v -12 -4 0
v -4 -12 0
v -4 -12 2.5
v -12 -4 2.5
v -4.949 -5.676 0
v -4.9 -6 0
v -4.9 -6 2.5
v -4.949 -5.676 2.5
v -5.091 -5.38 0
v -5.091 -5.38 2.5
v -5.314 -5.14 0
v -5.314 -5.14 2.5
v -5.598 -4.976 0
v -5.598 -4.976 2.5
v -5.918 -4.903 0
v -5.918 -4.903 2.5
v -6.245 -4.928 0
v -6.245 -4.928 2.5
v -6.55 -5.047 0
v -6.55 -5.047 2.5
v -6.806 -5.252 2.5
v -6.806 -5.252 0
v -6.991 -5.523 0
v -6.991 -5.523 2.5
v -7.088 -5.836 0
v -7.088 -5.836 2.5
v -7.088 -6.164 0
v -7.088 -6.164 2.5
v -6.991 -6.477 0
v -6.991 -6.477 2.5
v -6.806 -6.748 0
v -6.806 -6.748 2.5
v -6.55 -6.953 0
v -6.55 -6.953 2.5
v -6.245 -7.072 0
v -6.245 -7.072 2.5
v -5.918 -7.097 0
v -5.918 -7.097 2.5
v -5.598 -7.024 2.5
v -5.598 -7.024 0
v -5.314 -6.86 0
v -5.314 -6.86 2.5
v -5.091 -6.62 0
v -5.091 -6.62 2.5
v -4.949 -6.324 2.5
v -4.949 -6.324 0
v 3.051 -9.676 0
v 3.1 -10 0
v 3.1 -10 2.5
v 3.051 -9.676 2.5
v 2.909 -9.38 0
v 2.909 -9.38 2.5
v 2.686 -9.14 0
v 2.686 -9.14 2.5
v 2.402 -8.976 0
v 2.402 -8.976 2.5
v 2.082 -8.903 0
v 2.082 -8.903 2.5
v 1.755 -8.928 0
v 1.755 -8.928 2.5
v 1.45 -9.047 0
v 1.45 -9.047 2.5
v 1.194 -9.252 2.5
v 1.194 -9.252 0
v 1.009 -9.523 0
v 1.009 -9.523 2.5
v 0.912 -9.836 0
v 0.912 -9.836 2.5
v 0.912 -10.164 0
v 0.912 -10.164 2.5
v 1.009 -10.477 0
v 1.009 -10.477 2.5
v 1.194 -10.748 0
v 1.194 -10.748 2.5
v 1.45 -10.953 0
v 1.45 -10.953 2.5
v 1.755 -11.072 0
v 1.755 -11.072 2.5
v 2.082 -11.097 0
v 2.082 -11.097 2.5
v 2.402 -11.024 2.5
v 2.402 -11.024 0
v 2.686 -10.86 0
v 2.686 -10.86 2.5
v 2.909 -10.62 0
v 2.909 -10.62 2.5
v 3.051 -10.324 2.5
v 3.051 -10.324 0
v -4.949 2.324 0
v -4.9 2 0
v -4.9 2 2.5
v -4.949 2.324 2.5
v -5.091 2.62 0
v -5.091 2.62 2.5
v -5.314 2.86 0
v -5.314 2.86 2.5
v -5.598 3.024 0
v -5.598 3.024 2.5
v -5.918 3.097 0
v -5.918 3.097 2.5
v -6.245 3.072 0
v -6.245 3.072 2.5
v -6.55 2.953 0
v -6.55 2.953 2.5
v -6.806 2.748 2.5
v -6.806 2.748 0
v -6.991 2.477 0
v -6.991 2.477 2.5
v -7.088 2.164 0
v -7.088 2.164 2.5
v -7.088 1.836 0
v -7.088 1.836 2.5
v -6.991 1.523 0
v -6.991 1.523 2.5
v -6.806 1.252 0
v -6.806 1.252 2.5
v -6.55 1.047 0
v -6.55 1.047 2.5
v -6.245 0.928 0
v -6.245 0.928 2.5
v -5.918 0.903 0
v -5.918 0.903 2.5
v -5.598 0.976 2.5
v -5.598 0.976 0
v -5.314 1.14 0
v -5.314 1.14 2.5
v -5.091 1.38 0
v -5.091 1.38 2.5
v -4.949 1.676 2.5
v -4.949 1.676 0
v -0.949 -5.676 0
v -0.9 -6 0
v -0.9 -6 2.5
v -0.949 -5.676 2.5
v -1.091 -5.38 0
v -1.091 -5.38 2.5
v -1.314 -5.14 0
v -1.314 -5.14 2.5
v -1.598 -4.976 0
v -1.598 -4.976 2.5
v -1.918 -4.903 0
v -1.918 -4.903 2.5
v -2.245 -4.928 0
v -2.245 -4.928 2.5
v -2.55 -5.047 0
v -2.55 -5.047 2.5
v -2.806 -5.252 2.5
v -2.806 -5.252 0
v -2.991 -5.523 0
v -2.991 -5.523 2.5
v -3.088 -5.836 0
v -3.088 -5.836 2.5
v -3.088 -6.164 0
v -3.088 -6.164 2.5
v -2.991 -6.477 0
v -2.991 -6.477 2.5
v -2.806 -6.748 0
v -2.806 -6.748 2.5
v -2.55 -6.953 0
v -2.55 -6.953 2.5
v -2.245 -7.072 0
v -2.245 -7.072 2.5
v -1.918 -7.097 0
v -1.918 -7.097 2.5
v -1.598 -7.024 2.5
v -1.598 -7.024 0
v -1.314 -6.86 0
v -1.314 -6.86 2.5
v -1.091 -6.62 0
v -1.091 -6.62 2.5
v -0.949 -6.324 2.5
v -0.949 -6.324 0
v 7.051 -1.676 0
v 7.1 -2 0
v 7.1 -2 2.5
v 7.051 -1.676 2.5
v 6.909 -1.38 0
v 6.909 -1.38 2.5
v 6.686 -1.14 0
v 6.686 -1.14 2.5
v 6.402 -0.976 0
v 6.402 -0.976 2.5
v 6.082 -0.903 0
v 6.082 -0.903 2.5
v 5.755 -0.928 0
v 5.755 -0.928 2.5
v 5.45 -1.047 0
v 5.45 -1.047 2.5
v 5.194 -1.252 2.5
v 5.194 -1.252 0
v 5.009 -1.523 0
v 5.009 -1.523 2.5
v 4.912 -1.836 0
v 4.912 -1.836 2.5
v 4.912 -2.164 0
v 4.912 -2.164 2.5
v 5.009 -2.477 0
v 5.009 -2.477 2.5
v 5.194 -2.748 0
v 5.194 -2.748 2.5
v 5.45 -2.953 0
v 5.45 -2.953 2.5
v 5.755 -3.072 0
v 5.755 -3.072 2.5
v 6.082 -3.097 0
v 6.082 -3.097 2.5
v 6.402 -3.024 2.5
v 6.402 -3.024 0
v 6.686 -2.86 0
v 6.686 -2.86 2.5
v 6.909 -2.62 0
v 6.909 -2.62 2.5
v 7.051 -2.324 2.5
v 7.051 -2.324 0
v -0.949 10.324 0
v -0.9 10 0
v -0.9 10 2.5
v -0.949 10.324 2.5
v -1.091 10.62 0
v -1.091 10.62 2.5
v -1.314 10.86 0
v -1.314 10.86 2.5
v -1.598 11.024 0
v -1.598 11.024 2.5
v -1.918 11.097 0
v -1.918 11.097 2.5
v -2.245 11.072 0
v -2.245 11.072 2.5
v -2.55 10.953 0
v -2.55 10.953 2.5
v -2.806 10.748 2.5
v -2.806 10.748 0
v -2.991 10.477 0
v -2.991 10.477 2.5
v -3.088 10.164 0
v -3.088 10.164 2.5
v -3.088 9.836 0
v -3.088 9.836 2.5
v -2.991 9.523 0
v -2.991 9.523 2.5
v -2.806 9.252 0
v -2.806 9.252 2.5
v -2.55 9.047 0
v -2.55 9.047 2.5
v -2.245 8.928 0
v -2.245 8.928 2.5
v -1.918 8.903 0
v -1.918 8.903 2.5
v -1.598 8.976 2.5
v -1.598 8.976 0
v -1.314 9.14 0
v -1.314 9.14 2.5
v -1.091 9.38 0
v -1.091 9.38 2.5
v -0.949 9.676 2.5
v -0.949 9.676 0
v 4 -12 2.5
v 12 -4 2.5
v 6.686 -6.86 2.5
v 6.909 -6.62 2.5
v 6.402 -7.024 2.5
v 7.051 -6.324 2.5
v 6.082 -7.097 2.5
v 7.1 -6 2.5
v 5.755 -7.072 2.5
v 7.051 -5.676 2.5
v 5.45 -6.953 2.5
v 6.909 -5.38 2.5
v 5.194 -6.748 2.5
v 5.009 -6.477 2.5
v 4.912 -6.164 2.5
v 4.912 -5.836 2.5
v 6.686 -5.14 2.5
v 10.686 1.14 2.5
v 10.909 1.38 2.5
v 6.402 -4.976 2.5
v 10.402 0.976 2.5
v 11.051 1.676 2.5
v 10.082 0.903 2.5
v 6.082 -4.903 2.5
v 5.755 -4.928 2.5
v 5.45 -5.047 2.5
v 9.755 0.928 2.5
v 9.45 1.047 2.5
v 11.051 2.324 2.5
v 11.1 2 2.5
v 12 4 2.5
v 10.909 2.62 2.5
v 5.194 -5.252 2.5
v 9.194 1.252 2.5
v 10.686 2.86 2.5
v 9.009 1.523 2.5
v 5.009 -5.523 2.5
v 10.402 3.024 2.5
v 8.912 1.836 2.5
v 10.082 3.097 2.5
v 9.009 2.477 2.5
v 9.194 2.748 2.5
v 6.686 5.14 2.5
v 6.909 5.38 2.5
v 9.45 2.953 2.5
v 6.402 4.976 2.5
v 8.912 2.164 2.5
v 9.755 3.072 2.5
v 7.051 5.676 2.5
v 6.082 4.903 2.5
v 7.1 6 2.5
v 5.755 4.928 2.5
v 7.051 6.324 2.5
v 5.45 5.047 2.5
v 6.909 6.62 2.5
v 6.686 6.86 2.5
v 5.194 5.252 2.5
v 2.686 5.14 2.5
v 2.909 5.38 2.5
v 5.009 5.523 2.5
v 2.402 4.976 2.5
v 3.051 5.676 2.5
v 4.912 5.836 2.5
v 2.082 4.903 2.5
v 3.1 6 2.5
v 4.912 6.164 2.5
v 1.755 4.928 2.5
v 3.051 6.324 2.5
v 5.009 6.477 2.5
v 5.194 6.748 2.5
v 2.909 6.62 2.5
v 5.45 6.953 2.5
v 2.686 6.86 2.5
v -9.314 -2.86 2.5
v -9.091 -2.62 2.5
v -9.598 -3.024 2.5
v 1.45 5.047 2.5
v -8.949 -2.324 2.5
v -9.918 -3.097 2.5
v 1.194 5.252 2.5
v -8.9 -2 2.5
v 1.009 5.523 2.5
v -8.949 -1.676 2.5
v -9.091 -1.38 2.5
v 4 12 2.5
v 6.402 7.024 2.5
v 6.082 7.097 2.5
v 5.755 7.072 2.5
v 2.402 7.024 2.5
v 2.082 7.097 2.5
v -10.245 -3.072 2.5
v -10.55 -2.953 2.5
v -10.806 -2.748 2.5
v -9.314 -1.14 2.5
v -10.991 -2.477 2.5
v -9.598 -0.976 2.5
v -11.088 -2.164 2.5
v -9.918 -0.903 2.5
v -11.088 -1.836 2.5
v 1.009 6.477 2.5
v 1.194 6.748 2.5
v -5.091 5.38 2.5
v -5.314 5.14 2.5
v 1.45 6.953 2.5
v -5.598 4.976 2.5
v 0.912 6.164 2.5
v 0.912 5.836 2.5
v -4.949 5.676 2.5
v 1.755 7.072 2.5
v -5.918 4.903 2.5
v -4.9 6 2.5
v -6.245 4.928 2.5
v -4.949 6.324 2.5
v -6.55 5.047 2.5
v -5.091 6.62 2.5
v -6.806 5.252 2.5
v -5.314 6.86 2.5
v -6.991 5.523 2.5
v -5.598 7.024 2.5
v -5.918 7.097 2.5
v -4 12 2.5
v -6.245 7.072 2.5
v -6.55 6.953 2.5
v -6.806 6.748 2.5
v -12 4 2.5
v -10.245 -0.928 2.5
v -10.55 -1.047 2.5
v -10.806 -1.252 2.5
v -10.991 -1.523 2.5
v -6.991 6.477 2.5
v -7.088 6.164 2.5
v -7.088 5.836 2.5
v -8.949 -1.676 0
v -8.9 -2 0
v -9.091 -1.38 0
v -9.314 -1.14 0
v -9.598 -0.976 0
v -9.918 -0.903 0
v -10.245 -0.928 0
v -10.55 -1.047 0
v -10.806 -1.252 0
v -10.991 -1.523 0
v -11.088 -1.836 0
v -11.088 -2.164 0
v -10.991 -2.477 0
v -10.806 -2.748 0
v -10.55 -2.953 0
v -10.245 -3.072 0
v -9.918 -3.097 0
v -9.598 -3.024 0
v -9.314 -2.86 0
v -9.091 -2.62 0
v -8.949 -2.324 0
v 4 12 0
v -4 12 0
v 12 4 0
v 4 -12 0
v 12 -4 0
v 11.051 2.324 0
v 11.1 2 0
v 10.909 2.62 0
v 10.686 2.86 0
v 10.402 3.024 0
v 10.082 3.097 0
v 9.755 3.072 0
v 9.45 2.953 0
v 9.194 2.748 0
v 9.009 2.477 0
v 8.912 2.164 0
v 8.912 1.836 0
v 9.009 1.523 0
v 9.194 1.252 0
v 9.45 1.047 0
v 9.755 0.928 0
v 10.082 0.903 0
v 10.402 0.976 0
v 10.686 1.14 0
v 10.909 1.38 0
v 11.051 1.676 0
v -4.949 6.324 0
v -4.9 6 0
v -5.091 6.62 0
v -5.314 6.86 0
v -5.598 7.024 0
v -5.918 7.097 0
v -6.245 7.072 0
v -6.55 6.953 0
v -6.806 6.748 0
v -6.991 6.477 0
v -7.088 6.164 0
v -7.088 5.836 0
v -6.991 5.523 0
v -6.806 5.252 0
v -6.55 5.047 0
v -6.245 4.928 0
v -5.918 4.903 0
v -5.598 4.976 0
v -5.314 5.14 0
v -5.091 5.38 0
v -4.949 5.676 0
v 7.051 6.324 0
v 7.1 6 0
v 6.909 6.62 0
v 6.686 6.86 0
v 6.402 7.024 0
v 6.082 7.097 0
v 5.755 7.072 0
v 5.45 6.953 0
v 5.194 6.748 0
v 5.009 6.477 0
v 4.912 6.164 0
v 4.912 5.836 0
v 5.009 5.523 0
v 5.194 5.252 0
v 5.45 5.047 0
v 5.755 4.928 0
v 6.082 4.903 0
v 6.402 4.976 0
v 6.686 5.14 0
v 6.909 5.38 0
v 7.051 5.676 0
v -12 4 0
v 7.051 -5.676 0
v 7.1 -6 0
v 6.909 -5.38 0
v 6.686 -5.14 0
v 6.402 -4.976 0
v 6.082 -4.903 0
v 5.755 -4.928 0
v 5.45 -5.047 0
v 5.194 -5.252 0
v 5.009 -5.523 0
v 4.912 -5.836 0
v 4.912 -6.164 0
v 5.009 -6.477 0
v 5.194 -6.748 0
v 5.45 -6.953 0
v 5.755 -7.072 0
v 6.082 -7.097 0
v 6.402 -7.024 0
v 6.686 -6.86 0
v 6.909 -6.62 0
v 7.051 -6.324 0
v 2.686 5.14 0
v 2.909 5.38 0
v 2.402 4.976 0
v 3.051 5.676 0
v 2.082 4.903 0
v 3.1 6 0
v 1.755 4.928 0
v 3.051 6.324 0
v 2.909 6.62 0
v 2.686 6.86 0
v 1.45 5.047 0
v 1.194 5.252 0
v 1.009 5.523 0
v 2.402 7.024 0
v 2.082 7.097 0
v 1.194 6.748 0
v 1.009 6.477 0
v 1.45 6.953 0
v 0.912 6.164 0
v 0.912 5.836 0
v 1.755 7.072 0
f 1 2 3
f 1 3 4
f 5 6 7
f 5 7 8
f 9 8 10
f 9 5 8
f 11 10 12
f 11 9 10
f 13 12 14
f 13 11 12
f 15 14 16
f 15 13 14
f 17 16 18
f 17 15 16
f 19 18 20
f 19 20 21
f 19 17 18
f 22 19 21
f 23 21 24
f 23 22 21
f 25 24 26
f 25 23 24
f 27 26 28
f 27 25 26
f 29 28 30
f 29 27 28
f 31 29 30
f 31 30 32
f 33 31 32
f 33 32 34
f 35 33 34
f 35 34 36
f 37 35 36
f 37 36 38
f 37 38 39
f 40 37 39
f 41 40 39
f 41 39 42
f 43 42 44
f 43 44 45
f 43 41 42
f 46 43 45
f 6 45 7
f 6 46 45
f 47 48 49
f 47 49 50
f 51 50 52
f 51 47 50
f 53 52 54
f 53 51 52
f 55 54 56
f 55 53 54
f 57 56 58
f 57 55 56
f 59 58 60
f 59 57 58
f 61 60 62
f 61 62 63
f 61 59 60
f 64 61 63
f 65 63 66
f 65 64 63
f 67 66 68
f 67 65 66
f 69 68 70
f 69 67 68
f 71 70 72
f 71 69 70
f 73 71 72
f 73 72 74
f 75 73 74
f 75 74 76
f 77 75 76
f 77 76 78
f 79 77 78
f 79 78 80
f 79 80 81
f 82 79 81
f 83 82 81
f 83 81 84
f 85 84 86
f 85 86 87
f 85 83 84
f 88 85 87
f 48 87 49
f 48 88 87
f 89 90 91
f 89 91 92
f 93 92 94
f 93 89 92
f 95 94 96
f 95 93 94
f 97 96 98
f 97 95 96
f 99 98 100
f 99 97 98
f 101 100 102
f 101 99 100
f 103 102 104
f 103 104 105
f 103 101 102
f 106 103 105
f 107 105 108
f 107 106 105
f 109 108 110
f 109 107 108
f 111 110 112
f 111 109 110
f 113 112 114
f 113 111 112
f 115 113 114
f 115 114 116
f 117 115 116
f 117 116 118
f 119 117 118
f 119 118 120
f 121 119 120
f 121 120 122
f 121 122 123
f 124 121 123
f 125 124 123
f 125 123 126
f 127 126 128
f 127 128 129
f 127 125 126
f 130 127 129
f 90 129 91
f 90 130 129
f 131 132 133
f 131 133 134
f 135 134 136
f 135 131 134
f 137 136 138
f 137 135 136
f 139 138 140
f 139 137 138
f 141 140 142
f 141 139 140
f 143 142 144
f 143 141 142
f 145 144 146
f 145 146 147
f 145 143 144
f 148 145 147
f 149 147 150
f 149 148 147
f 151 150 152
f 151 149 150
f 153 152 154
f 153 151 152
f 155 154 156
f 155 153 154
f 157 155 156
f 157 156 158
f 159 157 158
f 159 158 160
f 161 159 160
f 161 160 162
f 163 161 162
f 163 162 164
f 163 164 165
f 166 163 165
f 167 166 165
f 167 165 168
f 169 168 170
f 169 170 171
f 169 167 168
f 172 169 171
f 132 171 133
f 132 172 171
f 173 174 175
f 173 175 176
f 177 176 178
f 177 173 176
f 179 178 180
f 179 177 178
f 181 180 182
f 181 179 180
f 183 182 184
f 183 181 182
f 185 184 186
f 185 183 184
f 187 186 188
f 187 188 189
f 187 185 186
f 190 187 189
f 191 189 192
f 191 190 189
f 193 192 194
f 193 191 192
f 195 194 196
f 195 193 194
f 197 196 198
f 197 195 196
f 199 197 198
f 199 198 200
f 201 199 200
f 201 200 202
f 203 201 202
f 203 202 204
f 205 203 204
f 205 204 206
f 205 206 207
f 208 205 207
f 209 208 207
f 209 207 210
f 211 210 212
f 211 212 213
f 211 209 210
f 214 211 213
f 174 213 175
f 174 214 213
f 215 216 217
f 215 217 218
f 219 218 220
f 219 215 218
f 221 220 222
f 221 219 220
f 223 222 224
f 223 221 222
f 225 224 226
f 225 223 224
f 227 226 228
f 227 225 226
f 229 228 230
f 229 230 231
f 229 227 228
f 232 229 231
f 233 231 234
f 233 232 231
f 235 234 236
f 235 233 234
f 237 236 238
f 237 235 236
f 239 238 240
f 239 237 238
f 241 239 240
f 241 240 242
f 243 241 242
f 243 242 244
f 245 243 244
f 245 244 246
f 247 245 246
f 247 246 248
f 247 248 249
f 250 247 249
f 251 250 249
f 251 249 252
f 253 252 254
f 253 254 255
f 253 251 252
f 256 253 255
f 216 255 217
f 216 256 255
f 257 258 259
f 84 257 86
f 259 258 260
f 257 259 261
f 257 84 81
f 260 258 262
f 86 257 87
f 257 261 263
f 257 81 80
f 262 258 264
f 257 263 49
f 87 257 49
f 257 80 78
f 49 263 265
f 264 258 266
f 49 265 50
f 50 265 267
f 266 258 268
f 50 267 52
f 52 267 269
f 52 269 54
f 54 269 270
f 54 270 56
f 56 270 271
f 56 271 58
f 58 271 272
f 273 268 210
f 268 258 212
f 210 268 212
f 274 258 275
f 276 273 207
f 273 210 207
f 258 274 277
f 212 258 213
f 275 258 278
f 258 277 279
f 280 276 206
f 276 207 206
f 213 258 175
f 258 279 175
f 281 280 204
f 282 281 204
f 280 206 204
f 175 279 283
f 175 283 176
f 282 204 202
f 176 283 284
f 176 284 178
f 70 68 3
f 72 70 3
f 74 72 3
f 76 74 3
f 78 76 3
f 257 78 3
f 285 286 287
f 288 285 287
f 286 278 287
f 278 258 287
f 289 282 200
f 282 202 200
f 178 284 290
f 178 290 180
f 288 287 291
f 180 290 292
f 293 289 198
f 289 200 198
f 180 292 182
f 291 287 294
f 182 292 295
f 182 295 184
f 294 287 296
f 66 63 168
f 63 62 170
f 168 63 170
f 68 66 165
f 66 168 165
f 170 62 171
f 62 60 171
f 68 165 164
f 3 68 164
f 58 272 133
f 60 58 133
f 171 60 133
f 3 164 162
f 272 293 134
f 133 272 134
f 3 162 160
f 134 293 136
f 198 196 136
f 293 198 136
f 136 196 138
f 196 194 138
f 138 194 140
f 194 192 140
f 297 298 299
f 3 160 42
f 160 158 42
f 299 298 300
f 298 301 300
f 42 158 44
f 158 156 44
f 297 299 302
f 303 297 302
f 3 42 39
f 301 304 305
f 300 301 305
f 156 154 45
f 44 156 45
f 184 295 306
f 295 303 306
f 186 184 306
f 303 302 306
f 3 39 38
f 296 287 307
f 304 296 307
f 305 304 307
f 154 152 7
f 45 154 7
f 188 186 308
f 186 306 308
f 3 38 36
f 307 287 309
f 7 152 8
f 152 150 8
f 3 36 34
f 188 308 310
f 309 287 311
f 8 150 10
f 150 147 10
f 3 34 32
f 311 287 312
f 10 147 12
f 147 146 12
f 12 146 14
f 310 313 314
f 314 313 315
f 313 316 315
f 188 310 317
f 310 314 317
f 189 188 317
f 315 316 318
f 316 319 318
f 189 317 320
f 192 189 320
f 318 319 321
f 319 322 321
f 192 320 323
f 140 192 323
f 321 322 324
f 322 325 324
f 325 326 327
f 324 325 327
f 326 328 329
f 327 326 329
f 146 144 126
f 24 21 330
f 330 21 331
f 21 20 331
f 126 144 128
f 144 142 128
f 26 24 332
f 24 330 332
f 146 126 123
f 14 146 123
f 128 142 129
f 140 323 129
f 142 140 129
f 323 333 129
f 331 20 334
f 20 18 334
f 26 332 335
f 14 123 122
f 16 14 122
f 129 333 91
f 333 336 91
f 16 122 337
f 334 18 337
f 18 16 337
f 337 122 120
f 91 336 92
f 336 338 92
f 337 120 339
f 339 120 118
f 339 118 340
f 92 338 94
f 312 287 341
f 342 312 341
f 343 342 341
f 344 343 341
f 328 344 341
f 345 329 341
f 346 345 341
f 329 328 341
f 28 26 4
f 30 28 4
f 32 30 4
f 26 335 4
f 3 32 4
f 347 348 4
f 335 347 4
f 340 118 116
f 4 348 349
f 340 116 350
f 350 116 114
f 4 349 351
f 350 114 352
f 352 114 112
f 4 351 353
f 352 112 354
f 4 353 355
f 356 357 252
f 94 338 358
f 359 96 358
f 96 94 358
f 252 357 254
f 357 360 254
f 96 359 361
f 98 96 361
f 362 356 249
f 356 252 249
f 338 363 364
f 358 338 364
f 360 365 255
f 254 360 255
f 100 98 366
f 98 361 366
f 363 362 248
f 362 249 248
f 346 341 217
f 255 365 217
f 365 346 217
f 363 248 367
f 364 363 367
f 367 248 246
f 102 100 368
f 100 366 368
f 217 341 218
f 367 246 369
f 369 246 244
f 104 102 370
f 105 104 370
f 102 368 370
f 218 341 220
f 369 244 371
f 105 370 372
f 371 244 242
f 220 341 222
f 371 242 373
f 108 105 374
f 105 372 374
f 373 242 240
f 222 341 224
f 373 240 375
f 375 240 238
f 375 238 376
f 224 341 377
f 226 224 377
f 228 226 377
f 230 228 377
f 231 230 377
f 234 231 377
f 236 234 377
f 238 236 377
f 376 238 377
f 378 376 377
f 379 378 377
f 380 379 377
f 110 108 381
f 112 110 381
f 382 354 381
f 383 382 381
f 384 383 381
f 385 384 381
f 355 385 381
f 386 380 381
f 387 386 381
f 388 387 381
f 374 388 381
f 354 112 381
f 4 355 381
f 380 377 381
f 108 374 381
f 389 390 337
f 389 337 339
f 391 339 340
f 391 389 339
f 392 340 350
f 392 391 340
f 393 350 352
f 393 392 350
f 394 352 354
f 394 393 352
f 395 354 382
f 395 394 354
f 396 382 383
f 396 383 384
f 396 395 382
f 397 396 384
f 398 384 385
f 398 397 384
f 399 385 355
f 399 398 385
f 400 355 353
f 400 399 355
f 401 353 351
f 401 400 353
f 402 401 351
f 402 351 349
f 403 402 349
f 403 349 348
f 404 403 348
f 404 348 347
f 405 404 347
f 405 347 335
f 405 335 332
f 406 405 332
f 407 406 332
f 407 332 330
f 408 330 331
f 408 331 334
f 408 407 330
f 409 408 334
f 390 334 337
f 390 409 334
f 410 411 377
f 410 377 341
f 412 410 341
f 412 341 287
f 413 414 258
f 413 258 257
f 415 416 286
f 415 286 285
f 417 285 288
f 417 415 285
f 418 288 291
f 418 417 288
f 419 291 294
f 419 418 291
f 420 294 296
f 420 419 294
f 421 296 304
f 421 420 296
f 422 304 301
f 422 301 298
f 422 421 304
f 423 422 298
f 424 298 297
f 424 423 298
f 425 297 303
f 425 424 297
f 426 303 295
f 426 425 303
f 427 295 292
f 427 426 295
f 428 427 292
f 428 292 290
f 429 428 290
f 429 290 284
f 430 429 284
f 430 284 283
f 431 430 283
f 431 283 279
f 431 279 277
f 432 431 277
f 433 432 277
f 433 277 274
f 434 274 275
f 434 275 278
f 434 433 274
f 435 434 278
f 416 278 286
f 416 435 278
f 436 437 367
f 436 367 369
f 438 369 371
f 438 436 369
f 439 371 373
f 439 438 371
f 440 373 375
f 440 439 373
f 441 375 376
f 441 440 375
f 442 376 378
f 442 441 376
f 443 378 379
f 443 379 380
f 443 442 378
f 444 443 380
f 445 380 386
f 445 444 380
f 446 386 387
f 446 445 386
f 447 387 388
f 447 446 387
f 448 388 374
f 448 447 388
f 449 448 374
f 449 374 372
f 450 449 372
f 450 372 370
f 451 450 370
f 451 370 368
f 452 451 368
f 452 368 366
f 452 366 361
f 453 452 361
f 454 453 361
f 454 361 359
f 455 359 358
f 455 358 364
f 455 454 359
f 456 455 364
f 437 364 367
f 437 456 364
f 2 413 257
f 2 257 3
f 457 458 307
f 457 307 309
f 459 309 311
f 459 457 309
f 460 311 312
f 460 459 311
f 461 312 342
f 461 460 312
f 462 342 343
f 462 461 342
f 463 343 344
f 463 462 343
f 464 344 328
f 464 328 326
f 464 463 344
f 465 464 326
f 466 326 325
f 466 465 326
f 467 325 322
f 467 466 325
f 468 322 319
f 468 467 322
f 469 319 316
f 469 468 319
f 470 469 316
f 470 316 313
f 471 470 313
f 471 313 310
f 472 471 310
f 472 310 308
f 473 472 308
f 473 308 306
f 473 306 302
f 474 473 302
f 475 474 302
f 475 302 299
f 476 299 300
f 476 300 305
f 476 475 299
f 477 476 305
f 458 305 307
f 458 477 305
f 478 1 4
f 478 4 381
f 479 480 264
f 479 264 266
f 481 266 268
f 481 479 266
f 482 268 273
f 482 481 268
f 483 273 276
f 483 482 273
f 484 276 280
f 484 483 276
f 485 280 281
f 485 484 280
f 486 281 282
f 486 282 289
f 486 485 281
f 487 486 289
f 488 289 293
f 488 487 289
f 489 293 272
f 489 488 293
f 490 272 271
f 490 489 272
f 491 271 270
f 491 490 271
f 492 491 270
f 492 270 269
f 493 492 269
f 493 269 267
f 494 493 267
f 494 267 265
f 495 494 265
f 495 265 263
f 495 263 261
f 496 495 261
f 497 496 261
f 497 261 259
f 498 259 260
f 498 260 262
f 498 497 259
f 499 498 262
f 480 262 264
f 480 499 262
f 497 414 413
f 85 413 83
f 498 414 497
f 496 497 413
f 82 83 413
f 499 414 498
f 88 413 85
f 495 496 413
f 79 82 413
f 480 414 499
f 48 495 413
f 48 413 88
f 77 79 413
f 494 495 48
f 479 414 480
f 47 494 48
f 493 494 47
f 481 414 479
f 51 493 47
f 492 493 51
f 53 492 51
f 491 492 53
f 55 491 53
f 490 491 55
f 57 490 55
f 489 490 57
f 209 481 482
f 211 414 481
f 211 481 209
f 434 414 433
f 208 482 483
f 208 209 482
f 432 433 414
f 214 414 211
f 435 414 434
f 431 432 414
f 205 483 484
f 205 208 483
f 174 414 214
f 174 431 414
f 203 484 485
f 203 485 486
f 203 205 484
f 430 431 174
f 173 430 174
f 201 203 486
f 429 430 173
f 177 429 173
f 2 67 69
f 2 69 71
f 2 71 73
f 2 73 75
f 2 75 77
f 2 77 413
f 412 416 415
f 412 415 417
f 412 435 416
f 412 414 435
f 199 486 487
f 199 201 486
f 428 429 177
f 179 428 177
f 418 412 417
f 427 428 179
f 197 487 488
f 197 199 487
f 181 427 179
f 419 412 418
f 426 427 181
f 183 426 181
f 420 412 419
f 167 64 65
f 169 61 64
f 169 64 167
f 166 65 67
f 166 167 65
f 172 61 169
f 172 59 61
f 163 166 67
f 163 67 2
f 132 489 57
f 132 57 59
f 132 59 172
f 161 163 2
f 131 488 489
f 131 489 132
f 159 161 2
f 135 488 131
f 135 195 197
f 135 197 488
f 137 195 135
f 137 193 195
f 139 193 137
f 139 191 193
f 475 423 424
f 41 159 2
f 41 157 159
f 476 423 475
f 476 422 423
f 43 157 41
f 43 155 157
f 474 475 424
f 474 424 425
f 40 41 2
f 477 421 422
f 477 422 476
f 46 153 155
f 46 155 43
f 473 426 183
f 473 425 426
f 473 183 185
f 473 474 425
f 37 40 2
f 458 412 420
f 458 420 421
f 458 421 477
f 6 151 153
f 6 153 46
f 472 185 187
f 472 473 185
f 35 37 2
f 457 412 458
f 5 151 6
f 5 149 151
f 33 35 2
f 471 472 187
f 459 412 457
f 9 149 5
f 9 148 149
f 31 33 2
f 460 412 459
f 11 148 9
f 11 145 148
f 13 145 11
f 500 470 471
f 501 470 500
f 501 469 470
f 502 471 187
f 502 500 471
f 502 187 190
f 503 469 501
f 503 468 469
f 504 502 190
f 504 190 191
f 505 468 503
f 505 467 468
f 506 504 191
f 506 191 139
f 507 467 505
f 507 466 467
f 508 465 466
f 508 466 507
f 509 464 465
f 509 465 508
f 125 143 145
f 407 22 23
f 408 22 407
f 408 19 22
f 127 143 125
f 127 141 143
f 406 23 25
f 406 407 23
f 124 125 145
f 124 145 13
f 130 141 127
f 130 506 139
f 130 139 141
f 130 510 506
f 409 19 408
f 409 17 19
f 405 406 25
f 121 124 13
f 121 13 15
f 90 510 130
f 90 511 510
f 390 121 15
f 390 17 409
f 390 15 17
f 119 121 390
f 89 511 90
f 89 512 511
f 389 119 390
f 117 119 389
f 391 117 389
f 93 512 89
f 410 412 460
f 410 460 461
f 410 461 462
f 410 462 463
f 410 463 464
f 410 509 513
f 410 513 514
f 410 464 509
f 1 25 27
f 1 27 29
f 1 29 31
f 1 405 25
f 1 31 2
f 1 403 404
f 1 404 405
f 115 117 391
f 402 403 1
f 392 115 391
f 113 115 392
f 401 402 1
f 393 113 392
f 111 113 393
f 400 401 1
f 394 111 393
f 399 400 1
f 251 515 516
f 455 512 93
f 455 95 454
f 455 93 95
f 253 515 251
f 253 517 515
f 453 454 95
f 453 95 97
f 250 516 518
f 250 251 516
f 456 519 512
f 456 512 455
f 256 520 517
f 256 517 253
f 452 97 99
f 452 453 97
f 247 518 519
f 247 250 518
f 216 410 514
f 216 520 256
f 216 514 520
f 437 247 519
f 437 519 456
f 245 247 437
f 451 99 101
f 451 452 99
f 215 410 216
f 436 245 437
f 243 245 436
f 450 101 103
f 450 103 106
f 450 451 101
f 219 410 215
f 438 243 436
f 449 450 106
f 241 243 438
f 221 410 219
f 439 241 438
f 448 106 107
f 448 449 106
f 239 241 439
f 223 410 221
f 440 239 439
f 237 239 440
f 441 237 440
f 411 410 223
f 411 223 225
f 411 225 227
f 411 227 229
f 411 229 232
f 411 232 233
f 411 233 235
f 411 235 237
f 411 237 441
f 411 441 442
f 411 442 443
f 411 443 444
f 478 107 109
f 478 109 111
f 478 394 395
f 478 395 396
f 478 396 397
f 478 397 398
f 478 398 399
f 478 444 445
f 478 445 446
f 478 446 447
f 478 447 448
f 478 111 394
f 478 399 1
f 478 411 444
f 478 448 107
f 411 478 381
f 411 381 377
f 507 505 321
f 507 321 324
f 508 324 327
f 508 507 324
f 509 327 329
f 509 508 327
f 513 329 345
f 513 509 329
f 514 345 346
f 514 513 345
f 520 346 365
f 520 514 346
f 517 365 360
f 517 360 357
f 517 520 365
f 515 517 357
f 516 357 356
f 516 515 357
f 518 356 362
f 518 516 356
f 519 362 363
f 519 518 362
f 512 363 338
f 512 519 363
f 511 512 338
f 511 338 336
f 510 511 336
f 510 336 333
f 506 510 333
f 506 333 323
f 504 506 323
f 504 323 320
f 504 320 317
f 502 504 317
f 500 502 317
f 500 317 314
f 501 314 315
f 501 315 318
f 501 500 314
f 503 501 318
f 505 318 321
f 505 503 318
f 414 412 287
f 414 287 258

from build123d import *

# Parameters (mm, degrees)
SKIZZE1_R                       = 1.1
AUFSATZ_LINEAR_AUSTRAGEN1_DEPTH = 2.5


with BuildPart() as part:
    # Skizze1 → Aufsatz-Linear austragen1 (new body)
    with BuildSketch(Plane.XY):
        Polygon((-4, 12), (4, 12), (12, 4), (12, -4), (4, -12), (-4, -12), (-12, -4), (-12, 4), align=None)
        with Locations((-2, 10)):
            Circle(SKIZZE1_R, mode=Mode.SUBTRACT)
        with Locations((2, 6)):
            Circle(SKIZZE1_R, mode=Mode.SUBTRACT)
        with Locations((10, 2)):
            Circle(SKIZZE1_R, mode=Mode.SUBTRACT)
        with Locations((6, -2)):
            Circle(SKIZZE1_R, mode=Mode.SUBTRACT)
        with Locations((2, -10)):
            Circle(SKIZZE1_R, mode=Mode.SUBTRACT)
        with Locations((-2, -6)):
            Circle(SKIZZE1_R, mode=Mode.SUBTRACT)
        with Locations((-6, 2)):
            Circle(SKIZZE1_R, mode=Mode.SUBTRACT)
        with Locations((-10, -2)):
            Circle(SKIZZE1_R, mode=Mode.SUBTRACT)
        with Locations((-6, 6)):
            Circle(SKIZZE1_R, mode=Mode.SUBTRACT)
        with Locations((6, 6)):
            Circle(SKIZZE1_R, mode=Mode.SUBTRACT)
        with Locations((6, -6)):
            Circle(SKIZZE1_R, mode=Mode.SUBTRACT)
        with Locations((-6, -6)):
            Circle(SKIZZE1_R, mode=Mode.SUBTRACT)
    extrude(amount=AUFSATZ_LINEAR_AUSTRAGEN1_DEPTH)


solid = part.part
